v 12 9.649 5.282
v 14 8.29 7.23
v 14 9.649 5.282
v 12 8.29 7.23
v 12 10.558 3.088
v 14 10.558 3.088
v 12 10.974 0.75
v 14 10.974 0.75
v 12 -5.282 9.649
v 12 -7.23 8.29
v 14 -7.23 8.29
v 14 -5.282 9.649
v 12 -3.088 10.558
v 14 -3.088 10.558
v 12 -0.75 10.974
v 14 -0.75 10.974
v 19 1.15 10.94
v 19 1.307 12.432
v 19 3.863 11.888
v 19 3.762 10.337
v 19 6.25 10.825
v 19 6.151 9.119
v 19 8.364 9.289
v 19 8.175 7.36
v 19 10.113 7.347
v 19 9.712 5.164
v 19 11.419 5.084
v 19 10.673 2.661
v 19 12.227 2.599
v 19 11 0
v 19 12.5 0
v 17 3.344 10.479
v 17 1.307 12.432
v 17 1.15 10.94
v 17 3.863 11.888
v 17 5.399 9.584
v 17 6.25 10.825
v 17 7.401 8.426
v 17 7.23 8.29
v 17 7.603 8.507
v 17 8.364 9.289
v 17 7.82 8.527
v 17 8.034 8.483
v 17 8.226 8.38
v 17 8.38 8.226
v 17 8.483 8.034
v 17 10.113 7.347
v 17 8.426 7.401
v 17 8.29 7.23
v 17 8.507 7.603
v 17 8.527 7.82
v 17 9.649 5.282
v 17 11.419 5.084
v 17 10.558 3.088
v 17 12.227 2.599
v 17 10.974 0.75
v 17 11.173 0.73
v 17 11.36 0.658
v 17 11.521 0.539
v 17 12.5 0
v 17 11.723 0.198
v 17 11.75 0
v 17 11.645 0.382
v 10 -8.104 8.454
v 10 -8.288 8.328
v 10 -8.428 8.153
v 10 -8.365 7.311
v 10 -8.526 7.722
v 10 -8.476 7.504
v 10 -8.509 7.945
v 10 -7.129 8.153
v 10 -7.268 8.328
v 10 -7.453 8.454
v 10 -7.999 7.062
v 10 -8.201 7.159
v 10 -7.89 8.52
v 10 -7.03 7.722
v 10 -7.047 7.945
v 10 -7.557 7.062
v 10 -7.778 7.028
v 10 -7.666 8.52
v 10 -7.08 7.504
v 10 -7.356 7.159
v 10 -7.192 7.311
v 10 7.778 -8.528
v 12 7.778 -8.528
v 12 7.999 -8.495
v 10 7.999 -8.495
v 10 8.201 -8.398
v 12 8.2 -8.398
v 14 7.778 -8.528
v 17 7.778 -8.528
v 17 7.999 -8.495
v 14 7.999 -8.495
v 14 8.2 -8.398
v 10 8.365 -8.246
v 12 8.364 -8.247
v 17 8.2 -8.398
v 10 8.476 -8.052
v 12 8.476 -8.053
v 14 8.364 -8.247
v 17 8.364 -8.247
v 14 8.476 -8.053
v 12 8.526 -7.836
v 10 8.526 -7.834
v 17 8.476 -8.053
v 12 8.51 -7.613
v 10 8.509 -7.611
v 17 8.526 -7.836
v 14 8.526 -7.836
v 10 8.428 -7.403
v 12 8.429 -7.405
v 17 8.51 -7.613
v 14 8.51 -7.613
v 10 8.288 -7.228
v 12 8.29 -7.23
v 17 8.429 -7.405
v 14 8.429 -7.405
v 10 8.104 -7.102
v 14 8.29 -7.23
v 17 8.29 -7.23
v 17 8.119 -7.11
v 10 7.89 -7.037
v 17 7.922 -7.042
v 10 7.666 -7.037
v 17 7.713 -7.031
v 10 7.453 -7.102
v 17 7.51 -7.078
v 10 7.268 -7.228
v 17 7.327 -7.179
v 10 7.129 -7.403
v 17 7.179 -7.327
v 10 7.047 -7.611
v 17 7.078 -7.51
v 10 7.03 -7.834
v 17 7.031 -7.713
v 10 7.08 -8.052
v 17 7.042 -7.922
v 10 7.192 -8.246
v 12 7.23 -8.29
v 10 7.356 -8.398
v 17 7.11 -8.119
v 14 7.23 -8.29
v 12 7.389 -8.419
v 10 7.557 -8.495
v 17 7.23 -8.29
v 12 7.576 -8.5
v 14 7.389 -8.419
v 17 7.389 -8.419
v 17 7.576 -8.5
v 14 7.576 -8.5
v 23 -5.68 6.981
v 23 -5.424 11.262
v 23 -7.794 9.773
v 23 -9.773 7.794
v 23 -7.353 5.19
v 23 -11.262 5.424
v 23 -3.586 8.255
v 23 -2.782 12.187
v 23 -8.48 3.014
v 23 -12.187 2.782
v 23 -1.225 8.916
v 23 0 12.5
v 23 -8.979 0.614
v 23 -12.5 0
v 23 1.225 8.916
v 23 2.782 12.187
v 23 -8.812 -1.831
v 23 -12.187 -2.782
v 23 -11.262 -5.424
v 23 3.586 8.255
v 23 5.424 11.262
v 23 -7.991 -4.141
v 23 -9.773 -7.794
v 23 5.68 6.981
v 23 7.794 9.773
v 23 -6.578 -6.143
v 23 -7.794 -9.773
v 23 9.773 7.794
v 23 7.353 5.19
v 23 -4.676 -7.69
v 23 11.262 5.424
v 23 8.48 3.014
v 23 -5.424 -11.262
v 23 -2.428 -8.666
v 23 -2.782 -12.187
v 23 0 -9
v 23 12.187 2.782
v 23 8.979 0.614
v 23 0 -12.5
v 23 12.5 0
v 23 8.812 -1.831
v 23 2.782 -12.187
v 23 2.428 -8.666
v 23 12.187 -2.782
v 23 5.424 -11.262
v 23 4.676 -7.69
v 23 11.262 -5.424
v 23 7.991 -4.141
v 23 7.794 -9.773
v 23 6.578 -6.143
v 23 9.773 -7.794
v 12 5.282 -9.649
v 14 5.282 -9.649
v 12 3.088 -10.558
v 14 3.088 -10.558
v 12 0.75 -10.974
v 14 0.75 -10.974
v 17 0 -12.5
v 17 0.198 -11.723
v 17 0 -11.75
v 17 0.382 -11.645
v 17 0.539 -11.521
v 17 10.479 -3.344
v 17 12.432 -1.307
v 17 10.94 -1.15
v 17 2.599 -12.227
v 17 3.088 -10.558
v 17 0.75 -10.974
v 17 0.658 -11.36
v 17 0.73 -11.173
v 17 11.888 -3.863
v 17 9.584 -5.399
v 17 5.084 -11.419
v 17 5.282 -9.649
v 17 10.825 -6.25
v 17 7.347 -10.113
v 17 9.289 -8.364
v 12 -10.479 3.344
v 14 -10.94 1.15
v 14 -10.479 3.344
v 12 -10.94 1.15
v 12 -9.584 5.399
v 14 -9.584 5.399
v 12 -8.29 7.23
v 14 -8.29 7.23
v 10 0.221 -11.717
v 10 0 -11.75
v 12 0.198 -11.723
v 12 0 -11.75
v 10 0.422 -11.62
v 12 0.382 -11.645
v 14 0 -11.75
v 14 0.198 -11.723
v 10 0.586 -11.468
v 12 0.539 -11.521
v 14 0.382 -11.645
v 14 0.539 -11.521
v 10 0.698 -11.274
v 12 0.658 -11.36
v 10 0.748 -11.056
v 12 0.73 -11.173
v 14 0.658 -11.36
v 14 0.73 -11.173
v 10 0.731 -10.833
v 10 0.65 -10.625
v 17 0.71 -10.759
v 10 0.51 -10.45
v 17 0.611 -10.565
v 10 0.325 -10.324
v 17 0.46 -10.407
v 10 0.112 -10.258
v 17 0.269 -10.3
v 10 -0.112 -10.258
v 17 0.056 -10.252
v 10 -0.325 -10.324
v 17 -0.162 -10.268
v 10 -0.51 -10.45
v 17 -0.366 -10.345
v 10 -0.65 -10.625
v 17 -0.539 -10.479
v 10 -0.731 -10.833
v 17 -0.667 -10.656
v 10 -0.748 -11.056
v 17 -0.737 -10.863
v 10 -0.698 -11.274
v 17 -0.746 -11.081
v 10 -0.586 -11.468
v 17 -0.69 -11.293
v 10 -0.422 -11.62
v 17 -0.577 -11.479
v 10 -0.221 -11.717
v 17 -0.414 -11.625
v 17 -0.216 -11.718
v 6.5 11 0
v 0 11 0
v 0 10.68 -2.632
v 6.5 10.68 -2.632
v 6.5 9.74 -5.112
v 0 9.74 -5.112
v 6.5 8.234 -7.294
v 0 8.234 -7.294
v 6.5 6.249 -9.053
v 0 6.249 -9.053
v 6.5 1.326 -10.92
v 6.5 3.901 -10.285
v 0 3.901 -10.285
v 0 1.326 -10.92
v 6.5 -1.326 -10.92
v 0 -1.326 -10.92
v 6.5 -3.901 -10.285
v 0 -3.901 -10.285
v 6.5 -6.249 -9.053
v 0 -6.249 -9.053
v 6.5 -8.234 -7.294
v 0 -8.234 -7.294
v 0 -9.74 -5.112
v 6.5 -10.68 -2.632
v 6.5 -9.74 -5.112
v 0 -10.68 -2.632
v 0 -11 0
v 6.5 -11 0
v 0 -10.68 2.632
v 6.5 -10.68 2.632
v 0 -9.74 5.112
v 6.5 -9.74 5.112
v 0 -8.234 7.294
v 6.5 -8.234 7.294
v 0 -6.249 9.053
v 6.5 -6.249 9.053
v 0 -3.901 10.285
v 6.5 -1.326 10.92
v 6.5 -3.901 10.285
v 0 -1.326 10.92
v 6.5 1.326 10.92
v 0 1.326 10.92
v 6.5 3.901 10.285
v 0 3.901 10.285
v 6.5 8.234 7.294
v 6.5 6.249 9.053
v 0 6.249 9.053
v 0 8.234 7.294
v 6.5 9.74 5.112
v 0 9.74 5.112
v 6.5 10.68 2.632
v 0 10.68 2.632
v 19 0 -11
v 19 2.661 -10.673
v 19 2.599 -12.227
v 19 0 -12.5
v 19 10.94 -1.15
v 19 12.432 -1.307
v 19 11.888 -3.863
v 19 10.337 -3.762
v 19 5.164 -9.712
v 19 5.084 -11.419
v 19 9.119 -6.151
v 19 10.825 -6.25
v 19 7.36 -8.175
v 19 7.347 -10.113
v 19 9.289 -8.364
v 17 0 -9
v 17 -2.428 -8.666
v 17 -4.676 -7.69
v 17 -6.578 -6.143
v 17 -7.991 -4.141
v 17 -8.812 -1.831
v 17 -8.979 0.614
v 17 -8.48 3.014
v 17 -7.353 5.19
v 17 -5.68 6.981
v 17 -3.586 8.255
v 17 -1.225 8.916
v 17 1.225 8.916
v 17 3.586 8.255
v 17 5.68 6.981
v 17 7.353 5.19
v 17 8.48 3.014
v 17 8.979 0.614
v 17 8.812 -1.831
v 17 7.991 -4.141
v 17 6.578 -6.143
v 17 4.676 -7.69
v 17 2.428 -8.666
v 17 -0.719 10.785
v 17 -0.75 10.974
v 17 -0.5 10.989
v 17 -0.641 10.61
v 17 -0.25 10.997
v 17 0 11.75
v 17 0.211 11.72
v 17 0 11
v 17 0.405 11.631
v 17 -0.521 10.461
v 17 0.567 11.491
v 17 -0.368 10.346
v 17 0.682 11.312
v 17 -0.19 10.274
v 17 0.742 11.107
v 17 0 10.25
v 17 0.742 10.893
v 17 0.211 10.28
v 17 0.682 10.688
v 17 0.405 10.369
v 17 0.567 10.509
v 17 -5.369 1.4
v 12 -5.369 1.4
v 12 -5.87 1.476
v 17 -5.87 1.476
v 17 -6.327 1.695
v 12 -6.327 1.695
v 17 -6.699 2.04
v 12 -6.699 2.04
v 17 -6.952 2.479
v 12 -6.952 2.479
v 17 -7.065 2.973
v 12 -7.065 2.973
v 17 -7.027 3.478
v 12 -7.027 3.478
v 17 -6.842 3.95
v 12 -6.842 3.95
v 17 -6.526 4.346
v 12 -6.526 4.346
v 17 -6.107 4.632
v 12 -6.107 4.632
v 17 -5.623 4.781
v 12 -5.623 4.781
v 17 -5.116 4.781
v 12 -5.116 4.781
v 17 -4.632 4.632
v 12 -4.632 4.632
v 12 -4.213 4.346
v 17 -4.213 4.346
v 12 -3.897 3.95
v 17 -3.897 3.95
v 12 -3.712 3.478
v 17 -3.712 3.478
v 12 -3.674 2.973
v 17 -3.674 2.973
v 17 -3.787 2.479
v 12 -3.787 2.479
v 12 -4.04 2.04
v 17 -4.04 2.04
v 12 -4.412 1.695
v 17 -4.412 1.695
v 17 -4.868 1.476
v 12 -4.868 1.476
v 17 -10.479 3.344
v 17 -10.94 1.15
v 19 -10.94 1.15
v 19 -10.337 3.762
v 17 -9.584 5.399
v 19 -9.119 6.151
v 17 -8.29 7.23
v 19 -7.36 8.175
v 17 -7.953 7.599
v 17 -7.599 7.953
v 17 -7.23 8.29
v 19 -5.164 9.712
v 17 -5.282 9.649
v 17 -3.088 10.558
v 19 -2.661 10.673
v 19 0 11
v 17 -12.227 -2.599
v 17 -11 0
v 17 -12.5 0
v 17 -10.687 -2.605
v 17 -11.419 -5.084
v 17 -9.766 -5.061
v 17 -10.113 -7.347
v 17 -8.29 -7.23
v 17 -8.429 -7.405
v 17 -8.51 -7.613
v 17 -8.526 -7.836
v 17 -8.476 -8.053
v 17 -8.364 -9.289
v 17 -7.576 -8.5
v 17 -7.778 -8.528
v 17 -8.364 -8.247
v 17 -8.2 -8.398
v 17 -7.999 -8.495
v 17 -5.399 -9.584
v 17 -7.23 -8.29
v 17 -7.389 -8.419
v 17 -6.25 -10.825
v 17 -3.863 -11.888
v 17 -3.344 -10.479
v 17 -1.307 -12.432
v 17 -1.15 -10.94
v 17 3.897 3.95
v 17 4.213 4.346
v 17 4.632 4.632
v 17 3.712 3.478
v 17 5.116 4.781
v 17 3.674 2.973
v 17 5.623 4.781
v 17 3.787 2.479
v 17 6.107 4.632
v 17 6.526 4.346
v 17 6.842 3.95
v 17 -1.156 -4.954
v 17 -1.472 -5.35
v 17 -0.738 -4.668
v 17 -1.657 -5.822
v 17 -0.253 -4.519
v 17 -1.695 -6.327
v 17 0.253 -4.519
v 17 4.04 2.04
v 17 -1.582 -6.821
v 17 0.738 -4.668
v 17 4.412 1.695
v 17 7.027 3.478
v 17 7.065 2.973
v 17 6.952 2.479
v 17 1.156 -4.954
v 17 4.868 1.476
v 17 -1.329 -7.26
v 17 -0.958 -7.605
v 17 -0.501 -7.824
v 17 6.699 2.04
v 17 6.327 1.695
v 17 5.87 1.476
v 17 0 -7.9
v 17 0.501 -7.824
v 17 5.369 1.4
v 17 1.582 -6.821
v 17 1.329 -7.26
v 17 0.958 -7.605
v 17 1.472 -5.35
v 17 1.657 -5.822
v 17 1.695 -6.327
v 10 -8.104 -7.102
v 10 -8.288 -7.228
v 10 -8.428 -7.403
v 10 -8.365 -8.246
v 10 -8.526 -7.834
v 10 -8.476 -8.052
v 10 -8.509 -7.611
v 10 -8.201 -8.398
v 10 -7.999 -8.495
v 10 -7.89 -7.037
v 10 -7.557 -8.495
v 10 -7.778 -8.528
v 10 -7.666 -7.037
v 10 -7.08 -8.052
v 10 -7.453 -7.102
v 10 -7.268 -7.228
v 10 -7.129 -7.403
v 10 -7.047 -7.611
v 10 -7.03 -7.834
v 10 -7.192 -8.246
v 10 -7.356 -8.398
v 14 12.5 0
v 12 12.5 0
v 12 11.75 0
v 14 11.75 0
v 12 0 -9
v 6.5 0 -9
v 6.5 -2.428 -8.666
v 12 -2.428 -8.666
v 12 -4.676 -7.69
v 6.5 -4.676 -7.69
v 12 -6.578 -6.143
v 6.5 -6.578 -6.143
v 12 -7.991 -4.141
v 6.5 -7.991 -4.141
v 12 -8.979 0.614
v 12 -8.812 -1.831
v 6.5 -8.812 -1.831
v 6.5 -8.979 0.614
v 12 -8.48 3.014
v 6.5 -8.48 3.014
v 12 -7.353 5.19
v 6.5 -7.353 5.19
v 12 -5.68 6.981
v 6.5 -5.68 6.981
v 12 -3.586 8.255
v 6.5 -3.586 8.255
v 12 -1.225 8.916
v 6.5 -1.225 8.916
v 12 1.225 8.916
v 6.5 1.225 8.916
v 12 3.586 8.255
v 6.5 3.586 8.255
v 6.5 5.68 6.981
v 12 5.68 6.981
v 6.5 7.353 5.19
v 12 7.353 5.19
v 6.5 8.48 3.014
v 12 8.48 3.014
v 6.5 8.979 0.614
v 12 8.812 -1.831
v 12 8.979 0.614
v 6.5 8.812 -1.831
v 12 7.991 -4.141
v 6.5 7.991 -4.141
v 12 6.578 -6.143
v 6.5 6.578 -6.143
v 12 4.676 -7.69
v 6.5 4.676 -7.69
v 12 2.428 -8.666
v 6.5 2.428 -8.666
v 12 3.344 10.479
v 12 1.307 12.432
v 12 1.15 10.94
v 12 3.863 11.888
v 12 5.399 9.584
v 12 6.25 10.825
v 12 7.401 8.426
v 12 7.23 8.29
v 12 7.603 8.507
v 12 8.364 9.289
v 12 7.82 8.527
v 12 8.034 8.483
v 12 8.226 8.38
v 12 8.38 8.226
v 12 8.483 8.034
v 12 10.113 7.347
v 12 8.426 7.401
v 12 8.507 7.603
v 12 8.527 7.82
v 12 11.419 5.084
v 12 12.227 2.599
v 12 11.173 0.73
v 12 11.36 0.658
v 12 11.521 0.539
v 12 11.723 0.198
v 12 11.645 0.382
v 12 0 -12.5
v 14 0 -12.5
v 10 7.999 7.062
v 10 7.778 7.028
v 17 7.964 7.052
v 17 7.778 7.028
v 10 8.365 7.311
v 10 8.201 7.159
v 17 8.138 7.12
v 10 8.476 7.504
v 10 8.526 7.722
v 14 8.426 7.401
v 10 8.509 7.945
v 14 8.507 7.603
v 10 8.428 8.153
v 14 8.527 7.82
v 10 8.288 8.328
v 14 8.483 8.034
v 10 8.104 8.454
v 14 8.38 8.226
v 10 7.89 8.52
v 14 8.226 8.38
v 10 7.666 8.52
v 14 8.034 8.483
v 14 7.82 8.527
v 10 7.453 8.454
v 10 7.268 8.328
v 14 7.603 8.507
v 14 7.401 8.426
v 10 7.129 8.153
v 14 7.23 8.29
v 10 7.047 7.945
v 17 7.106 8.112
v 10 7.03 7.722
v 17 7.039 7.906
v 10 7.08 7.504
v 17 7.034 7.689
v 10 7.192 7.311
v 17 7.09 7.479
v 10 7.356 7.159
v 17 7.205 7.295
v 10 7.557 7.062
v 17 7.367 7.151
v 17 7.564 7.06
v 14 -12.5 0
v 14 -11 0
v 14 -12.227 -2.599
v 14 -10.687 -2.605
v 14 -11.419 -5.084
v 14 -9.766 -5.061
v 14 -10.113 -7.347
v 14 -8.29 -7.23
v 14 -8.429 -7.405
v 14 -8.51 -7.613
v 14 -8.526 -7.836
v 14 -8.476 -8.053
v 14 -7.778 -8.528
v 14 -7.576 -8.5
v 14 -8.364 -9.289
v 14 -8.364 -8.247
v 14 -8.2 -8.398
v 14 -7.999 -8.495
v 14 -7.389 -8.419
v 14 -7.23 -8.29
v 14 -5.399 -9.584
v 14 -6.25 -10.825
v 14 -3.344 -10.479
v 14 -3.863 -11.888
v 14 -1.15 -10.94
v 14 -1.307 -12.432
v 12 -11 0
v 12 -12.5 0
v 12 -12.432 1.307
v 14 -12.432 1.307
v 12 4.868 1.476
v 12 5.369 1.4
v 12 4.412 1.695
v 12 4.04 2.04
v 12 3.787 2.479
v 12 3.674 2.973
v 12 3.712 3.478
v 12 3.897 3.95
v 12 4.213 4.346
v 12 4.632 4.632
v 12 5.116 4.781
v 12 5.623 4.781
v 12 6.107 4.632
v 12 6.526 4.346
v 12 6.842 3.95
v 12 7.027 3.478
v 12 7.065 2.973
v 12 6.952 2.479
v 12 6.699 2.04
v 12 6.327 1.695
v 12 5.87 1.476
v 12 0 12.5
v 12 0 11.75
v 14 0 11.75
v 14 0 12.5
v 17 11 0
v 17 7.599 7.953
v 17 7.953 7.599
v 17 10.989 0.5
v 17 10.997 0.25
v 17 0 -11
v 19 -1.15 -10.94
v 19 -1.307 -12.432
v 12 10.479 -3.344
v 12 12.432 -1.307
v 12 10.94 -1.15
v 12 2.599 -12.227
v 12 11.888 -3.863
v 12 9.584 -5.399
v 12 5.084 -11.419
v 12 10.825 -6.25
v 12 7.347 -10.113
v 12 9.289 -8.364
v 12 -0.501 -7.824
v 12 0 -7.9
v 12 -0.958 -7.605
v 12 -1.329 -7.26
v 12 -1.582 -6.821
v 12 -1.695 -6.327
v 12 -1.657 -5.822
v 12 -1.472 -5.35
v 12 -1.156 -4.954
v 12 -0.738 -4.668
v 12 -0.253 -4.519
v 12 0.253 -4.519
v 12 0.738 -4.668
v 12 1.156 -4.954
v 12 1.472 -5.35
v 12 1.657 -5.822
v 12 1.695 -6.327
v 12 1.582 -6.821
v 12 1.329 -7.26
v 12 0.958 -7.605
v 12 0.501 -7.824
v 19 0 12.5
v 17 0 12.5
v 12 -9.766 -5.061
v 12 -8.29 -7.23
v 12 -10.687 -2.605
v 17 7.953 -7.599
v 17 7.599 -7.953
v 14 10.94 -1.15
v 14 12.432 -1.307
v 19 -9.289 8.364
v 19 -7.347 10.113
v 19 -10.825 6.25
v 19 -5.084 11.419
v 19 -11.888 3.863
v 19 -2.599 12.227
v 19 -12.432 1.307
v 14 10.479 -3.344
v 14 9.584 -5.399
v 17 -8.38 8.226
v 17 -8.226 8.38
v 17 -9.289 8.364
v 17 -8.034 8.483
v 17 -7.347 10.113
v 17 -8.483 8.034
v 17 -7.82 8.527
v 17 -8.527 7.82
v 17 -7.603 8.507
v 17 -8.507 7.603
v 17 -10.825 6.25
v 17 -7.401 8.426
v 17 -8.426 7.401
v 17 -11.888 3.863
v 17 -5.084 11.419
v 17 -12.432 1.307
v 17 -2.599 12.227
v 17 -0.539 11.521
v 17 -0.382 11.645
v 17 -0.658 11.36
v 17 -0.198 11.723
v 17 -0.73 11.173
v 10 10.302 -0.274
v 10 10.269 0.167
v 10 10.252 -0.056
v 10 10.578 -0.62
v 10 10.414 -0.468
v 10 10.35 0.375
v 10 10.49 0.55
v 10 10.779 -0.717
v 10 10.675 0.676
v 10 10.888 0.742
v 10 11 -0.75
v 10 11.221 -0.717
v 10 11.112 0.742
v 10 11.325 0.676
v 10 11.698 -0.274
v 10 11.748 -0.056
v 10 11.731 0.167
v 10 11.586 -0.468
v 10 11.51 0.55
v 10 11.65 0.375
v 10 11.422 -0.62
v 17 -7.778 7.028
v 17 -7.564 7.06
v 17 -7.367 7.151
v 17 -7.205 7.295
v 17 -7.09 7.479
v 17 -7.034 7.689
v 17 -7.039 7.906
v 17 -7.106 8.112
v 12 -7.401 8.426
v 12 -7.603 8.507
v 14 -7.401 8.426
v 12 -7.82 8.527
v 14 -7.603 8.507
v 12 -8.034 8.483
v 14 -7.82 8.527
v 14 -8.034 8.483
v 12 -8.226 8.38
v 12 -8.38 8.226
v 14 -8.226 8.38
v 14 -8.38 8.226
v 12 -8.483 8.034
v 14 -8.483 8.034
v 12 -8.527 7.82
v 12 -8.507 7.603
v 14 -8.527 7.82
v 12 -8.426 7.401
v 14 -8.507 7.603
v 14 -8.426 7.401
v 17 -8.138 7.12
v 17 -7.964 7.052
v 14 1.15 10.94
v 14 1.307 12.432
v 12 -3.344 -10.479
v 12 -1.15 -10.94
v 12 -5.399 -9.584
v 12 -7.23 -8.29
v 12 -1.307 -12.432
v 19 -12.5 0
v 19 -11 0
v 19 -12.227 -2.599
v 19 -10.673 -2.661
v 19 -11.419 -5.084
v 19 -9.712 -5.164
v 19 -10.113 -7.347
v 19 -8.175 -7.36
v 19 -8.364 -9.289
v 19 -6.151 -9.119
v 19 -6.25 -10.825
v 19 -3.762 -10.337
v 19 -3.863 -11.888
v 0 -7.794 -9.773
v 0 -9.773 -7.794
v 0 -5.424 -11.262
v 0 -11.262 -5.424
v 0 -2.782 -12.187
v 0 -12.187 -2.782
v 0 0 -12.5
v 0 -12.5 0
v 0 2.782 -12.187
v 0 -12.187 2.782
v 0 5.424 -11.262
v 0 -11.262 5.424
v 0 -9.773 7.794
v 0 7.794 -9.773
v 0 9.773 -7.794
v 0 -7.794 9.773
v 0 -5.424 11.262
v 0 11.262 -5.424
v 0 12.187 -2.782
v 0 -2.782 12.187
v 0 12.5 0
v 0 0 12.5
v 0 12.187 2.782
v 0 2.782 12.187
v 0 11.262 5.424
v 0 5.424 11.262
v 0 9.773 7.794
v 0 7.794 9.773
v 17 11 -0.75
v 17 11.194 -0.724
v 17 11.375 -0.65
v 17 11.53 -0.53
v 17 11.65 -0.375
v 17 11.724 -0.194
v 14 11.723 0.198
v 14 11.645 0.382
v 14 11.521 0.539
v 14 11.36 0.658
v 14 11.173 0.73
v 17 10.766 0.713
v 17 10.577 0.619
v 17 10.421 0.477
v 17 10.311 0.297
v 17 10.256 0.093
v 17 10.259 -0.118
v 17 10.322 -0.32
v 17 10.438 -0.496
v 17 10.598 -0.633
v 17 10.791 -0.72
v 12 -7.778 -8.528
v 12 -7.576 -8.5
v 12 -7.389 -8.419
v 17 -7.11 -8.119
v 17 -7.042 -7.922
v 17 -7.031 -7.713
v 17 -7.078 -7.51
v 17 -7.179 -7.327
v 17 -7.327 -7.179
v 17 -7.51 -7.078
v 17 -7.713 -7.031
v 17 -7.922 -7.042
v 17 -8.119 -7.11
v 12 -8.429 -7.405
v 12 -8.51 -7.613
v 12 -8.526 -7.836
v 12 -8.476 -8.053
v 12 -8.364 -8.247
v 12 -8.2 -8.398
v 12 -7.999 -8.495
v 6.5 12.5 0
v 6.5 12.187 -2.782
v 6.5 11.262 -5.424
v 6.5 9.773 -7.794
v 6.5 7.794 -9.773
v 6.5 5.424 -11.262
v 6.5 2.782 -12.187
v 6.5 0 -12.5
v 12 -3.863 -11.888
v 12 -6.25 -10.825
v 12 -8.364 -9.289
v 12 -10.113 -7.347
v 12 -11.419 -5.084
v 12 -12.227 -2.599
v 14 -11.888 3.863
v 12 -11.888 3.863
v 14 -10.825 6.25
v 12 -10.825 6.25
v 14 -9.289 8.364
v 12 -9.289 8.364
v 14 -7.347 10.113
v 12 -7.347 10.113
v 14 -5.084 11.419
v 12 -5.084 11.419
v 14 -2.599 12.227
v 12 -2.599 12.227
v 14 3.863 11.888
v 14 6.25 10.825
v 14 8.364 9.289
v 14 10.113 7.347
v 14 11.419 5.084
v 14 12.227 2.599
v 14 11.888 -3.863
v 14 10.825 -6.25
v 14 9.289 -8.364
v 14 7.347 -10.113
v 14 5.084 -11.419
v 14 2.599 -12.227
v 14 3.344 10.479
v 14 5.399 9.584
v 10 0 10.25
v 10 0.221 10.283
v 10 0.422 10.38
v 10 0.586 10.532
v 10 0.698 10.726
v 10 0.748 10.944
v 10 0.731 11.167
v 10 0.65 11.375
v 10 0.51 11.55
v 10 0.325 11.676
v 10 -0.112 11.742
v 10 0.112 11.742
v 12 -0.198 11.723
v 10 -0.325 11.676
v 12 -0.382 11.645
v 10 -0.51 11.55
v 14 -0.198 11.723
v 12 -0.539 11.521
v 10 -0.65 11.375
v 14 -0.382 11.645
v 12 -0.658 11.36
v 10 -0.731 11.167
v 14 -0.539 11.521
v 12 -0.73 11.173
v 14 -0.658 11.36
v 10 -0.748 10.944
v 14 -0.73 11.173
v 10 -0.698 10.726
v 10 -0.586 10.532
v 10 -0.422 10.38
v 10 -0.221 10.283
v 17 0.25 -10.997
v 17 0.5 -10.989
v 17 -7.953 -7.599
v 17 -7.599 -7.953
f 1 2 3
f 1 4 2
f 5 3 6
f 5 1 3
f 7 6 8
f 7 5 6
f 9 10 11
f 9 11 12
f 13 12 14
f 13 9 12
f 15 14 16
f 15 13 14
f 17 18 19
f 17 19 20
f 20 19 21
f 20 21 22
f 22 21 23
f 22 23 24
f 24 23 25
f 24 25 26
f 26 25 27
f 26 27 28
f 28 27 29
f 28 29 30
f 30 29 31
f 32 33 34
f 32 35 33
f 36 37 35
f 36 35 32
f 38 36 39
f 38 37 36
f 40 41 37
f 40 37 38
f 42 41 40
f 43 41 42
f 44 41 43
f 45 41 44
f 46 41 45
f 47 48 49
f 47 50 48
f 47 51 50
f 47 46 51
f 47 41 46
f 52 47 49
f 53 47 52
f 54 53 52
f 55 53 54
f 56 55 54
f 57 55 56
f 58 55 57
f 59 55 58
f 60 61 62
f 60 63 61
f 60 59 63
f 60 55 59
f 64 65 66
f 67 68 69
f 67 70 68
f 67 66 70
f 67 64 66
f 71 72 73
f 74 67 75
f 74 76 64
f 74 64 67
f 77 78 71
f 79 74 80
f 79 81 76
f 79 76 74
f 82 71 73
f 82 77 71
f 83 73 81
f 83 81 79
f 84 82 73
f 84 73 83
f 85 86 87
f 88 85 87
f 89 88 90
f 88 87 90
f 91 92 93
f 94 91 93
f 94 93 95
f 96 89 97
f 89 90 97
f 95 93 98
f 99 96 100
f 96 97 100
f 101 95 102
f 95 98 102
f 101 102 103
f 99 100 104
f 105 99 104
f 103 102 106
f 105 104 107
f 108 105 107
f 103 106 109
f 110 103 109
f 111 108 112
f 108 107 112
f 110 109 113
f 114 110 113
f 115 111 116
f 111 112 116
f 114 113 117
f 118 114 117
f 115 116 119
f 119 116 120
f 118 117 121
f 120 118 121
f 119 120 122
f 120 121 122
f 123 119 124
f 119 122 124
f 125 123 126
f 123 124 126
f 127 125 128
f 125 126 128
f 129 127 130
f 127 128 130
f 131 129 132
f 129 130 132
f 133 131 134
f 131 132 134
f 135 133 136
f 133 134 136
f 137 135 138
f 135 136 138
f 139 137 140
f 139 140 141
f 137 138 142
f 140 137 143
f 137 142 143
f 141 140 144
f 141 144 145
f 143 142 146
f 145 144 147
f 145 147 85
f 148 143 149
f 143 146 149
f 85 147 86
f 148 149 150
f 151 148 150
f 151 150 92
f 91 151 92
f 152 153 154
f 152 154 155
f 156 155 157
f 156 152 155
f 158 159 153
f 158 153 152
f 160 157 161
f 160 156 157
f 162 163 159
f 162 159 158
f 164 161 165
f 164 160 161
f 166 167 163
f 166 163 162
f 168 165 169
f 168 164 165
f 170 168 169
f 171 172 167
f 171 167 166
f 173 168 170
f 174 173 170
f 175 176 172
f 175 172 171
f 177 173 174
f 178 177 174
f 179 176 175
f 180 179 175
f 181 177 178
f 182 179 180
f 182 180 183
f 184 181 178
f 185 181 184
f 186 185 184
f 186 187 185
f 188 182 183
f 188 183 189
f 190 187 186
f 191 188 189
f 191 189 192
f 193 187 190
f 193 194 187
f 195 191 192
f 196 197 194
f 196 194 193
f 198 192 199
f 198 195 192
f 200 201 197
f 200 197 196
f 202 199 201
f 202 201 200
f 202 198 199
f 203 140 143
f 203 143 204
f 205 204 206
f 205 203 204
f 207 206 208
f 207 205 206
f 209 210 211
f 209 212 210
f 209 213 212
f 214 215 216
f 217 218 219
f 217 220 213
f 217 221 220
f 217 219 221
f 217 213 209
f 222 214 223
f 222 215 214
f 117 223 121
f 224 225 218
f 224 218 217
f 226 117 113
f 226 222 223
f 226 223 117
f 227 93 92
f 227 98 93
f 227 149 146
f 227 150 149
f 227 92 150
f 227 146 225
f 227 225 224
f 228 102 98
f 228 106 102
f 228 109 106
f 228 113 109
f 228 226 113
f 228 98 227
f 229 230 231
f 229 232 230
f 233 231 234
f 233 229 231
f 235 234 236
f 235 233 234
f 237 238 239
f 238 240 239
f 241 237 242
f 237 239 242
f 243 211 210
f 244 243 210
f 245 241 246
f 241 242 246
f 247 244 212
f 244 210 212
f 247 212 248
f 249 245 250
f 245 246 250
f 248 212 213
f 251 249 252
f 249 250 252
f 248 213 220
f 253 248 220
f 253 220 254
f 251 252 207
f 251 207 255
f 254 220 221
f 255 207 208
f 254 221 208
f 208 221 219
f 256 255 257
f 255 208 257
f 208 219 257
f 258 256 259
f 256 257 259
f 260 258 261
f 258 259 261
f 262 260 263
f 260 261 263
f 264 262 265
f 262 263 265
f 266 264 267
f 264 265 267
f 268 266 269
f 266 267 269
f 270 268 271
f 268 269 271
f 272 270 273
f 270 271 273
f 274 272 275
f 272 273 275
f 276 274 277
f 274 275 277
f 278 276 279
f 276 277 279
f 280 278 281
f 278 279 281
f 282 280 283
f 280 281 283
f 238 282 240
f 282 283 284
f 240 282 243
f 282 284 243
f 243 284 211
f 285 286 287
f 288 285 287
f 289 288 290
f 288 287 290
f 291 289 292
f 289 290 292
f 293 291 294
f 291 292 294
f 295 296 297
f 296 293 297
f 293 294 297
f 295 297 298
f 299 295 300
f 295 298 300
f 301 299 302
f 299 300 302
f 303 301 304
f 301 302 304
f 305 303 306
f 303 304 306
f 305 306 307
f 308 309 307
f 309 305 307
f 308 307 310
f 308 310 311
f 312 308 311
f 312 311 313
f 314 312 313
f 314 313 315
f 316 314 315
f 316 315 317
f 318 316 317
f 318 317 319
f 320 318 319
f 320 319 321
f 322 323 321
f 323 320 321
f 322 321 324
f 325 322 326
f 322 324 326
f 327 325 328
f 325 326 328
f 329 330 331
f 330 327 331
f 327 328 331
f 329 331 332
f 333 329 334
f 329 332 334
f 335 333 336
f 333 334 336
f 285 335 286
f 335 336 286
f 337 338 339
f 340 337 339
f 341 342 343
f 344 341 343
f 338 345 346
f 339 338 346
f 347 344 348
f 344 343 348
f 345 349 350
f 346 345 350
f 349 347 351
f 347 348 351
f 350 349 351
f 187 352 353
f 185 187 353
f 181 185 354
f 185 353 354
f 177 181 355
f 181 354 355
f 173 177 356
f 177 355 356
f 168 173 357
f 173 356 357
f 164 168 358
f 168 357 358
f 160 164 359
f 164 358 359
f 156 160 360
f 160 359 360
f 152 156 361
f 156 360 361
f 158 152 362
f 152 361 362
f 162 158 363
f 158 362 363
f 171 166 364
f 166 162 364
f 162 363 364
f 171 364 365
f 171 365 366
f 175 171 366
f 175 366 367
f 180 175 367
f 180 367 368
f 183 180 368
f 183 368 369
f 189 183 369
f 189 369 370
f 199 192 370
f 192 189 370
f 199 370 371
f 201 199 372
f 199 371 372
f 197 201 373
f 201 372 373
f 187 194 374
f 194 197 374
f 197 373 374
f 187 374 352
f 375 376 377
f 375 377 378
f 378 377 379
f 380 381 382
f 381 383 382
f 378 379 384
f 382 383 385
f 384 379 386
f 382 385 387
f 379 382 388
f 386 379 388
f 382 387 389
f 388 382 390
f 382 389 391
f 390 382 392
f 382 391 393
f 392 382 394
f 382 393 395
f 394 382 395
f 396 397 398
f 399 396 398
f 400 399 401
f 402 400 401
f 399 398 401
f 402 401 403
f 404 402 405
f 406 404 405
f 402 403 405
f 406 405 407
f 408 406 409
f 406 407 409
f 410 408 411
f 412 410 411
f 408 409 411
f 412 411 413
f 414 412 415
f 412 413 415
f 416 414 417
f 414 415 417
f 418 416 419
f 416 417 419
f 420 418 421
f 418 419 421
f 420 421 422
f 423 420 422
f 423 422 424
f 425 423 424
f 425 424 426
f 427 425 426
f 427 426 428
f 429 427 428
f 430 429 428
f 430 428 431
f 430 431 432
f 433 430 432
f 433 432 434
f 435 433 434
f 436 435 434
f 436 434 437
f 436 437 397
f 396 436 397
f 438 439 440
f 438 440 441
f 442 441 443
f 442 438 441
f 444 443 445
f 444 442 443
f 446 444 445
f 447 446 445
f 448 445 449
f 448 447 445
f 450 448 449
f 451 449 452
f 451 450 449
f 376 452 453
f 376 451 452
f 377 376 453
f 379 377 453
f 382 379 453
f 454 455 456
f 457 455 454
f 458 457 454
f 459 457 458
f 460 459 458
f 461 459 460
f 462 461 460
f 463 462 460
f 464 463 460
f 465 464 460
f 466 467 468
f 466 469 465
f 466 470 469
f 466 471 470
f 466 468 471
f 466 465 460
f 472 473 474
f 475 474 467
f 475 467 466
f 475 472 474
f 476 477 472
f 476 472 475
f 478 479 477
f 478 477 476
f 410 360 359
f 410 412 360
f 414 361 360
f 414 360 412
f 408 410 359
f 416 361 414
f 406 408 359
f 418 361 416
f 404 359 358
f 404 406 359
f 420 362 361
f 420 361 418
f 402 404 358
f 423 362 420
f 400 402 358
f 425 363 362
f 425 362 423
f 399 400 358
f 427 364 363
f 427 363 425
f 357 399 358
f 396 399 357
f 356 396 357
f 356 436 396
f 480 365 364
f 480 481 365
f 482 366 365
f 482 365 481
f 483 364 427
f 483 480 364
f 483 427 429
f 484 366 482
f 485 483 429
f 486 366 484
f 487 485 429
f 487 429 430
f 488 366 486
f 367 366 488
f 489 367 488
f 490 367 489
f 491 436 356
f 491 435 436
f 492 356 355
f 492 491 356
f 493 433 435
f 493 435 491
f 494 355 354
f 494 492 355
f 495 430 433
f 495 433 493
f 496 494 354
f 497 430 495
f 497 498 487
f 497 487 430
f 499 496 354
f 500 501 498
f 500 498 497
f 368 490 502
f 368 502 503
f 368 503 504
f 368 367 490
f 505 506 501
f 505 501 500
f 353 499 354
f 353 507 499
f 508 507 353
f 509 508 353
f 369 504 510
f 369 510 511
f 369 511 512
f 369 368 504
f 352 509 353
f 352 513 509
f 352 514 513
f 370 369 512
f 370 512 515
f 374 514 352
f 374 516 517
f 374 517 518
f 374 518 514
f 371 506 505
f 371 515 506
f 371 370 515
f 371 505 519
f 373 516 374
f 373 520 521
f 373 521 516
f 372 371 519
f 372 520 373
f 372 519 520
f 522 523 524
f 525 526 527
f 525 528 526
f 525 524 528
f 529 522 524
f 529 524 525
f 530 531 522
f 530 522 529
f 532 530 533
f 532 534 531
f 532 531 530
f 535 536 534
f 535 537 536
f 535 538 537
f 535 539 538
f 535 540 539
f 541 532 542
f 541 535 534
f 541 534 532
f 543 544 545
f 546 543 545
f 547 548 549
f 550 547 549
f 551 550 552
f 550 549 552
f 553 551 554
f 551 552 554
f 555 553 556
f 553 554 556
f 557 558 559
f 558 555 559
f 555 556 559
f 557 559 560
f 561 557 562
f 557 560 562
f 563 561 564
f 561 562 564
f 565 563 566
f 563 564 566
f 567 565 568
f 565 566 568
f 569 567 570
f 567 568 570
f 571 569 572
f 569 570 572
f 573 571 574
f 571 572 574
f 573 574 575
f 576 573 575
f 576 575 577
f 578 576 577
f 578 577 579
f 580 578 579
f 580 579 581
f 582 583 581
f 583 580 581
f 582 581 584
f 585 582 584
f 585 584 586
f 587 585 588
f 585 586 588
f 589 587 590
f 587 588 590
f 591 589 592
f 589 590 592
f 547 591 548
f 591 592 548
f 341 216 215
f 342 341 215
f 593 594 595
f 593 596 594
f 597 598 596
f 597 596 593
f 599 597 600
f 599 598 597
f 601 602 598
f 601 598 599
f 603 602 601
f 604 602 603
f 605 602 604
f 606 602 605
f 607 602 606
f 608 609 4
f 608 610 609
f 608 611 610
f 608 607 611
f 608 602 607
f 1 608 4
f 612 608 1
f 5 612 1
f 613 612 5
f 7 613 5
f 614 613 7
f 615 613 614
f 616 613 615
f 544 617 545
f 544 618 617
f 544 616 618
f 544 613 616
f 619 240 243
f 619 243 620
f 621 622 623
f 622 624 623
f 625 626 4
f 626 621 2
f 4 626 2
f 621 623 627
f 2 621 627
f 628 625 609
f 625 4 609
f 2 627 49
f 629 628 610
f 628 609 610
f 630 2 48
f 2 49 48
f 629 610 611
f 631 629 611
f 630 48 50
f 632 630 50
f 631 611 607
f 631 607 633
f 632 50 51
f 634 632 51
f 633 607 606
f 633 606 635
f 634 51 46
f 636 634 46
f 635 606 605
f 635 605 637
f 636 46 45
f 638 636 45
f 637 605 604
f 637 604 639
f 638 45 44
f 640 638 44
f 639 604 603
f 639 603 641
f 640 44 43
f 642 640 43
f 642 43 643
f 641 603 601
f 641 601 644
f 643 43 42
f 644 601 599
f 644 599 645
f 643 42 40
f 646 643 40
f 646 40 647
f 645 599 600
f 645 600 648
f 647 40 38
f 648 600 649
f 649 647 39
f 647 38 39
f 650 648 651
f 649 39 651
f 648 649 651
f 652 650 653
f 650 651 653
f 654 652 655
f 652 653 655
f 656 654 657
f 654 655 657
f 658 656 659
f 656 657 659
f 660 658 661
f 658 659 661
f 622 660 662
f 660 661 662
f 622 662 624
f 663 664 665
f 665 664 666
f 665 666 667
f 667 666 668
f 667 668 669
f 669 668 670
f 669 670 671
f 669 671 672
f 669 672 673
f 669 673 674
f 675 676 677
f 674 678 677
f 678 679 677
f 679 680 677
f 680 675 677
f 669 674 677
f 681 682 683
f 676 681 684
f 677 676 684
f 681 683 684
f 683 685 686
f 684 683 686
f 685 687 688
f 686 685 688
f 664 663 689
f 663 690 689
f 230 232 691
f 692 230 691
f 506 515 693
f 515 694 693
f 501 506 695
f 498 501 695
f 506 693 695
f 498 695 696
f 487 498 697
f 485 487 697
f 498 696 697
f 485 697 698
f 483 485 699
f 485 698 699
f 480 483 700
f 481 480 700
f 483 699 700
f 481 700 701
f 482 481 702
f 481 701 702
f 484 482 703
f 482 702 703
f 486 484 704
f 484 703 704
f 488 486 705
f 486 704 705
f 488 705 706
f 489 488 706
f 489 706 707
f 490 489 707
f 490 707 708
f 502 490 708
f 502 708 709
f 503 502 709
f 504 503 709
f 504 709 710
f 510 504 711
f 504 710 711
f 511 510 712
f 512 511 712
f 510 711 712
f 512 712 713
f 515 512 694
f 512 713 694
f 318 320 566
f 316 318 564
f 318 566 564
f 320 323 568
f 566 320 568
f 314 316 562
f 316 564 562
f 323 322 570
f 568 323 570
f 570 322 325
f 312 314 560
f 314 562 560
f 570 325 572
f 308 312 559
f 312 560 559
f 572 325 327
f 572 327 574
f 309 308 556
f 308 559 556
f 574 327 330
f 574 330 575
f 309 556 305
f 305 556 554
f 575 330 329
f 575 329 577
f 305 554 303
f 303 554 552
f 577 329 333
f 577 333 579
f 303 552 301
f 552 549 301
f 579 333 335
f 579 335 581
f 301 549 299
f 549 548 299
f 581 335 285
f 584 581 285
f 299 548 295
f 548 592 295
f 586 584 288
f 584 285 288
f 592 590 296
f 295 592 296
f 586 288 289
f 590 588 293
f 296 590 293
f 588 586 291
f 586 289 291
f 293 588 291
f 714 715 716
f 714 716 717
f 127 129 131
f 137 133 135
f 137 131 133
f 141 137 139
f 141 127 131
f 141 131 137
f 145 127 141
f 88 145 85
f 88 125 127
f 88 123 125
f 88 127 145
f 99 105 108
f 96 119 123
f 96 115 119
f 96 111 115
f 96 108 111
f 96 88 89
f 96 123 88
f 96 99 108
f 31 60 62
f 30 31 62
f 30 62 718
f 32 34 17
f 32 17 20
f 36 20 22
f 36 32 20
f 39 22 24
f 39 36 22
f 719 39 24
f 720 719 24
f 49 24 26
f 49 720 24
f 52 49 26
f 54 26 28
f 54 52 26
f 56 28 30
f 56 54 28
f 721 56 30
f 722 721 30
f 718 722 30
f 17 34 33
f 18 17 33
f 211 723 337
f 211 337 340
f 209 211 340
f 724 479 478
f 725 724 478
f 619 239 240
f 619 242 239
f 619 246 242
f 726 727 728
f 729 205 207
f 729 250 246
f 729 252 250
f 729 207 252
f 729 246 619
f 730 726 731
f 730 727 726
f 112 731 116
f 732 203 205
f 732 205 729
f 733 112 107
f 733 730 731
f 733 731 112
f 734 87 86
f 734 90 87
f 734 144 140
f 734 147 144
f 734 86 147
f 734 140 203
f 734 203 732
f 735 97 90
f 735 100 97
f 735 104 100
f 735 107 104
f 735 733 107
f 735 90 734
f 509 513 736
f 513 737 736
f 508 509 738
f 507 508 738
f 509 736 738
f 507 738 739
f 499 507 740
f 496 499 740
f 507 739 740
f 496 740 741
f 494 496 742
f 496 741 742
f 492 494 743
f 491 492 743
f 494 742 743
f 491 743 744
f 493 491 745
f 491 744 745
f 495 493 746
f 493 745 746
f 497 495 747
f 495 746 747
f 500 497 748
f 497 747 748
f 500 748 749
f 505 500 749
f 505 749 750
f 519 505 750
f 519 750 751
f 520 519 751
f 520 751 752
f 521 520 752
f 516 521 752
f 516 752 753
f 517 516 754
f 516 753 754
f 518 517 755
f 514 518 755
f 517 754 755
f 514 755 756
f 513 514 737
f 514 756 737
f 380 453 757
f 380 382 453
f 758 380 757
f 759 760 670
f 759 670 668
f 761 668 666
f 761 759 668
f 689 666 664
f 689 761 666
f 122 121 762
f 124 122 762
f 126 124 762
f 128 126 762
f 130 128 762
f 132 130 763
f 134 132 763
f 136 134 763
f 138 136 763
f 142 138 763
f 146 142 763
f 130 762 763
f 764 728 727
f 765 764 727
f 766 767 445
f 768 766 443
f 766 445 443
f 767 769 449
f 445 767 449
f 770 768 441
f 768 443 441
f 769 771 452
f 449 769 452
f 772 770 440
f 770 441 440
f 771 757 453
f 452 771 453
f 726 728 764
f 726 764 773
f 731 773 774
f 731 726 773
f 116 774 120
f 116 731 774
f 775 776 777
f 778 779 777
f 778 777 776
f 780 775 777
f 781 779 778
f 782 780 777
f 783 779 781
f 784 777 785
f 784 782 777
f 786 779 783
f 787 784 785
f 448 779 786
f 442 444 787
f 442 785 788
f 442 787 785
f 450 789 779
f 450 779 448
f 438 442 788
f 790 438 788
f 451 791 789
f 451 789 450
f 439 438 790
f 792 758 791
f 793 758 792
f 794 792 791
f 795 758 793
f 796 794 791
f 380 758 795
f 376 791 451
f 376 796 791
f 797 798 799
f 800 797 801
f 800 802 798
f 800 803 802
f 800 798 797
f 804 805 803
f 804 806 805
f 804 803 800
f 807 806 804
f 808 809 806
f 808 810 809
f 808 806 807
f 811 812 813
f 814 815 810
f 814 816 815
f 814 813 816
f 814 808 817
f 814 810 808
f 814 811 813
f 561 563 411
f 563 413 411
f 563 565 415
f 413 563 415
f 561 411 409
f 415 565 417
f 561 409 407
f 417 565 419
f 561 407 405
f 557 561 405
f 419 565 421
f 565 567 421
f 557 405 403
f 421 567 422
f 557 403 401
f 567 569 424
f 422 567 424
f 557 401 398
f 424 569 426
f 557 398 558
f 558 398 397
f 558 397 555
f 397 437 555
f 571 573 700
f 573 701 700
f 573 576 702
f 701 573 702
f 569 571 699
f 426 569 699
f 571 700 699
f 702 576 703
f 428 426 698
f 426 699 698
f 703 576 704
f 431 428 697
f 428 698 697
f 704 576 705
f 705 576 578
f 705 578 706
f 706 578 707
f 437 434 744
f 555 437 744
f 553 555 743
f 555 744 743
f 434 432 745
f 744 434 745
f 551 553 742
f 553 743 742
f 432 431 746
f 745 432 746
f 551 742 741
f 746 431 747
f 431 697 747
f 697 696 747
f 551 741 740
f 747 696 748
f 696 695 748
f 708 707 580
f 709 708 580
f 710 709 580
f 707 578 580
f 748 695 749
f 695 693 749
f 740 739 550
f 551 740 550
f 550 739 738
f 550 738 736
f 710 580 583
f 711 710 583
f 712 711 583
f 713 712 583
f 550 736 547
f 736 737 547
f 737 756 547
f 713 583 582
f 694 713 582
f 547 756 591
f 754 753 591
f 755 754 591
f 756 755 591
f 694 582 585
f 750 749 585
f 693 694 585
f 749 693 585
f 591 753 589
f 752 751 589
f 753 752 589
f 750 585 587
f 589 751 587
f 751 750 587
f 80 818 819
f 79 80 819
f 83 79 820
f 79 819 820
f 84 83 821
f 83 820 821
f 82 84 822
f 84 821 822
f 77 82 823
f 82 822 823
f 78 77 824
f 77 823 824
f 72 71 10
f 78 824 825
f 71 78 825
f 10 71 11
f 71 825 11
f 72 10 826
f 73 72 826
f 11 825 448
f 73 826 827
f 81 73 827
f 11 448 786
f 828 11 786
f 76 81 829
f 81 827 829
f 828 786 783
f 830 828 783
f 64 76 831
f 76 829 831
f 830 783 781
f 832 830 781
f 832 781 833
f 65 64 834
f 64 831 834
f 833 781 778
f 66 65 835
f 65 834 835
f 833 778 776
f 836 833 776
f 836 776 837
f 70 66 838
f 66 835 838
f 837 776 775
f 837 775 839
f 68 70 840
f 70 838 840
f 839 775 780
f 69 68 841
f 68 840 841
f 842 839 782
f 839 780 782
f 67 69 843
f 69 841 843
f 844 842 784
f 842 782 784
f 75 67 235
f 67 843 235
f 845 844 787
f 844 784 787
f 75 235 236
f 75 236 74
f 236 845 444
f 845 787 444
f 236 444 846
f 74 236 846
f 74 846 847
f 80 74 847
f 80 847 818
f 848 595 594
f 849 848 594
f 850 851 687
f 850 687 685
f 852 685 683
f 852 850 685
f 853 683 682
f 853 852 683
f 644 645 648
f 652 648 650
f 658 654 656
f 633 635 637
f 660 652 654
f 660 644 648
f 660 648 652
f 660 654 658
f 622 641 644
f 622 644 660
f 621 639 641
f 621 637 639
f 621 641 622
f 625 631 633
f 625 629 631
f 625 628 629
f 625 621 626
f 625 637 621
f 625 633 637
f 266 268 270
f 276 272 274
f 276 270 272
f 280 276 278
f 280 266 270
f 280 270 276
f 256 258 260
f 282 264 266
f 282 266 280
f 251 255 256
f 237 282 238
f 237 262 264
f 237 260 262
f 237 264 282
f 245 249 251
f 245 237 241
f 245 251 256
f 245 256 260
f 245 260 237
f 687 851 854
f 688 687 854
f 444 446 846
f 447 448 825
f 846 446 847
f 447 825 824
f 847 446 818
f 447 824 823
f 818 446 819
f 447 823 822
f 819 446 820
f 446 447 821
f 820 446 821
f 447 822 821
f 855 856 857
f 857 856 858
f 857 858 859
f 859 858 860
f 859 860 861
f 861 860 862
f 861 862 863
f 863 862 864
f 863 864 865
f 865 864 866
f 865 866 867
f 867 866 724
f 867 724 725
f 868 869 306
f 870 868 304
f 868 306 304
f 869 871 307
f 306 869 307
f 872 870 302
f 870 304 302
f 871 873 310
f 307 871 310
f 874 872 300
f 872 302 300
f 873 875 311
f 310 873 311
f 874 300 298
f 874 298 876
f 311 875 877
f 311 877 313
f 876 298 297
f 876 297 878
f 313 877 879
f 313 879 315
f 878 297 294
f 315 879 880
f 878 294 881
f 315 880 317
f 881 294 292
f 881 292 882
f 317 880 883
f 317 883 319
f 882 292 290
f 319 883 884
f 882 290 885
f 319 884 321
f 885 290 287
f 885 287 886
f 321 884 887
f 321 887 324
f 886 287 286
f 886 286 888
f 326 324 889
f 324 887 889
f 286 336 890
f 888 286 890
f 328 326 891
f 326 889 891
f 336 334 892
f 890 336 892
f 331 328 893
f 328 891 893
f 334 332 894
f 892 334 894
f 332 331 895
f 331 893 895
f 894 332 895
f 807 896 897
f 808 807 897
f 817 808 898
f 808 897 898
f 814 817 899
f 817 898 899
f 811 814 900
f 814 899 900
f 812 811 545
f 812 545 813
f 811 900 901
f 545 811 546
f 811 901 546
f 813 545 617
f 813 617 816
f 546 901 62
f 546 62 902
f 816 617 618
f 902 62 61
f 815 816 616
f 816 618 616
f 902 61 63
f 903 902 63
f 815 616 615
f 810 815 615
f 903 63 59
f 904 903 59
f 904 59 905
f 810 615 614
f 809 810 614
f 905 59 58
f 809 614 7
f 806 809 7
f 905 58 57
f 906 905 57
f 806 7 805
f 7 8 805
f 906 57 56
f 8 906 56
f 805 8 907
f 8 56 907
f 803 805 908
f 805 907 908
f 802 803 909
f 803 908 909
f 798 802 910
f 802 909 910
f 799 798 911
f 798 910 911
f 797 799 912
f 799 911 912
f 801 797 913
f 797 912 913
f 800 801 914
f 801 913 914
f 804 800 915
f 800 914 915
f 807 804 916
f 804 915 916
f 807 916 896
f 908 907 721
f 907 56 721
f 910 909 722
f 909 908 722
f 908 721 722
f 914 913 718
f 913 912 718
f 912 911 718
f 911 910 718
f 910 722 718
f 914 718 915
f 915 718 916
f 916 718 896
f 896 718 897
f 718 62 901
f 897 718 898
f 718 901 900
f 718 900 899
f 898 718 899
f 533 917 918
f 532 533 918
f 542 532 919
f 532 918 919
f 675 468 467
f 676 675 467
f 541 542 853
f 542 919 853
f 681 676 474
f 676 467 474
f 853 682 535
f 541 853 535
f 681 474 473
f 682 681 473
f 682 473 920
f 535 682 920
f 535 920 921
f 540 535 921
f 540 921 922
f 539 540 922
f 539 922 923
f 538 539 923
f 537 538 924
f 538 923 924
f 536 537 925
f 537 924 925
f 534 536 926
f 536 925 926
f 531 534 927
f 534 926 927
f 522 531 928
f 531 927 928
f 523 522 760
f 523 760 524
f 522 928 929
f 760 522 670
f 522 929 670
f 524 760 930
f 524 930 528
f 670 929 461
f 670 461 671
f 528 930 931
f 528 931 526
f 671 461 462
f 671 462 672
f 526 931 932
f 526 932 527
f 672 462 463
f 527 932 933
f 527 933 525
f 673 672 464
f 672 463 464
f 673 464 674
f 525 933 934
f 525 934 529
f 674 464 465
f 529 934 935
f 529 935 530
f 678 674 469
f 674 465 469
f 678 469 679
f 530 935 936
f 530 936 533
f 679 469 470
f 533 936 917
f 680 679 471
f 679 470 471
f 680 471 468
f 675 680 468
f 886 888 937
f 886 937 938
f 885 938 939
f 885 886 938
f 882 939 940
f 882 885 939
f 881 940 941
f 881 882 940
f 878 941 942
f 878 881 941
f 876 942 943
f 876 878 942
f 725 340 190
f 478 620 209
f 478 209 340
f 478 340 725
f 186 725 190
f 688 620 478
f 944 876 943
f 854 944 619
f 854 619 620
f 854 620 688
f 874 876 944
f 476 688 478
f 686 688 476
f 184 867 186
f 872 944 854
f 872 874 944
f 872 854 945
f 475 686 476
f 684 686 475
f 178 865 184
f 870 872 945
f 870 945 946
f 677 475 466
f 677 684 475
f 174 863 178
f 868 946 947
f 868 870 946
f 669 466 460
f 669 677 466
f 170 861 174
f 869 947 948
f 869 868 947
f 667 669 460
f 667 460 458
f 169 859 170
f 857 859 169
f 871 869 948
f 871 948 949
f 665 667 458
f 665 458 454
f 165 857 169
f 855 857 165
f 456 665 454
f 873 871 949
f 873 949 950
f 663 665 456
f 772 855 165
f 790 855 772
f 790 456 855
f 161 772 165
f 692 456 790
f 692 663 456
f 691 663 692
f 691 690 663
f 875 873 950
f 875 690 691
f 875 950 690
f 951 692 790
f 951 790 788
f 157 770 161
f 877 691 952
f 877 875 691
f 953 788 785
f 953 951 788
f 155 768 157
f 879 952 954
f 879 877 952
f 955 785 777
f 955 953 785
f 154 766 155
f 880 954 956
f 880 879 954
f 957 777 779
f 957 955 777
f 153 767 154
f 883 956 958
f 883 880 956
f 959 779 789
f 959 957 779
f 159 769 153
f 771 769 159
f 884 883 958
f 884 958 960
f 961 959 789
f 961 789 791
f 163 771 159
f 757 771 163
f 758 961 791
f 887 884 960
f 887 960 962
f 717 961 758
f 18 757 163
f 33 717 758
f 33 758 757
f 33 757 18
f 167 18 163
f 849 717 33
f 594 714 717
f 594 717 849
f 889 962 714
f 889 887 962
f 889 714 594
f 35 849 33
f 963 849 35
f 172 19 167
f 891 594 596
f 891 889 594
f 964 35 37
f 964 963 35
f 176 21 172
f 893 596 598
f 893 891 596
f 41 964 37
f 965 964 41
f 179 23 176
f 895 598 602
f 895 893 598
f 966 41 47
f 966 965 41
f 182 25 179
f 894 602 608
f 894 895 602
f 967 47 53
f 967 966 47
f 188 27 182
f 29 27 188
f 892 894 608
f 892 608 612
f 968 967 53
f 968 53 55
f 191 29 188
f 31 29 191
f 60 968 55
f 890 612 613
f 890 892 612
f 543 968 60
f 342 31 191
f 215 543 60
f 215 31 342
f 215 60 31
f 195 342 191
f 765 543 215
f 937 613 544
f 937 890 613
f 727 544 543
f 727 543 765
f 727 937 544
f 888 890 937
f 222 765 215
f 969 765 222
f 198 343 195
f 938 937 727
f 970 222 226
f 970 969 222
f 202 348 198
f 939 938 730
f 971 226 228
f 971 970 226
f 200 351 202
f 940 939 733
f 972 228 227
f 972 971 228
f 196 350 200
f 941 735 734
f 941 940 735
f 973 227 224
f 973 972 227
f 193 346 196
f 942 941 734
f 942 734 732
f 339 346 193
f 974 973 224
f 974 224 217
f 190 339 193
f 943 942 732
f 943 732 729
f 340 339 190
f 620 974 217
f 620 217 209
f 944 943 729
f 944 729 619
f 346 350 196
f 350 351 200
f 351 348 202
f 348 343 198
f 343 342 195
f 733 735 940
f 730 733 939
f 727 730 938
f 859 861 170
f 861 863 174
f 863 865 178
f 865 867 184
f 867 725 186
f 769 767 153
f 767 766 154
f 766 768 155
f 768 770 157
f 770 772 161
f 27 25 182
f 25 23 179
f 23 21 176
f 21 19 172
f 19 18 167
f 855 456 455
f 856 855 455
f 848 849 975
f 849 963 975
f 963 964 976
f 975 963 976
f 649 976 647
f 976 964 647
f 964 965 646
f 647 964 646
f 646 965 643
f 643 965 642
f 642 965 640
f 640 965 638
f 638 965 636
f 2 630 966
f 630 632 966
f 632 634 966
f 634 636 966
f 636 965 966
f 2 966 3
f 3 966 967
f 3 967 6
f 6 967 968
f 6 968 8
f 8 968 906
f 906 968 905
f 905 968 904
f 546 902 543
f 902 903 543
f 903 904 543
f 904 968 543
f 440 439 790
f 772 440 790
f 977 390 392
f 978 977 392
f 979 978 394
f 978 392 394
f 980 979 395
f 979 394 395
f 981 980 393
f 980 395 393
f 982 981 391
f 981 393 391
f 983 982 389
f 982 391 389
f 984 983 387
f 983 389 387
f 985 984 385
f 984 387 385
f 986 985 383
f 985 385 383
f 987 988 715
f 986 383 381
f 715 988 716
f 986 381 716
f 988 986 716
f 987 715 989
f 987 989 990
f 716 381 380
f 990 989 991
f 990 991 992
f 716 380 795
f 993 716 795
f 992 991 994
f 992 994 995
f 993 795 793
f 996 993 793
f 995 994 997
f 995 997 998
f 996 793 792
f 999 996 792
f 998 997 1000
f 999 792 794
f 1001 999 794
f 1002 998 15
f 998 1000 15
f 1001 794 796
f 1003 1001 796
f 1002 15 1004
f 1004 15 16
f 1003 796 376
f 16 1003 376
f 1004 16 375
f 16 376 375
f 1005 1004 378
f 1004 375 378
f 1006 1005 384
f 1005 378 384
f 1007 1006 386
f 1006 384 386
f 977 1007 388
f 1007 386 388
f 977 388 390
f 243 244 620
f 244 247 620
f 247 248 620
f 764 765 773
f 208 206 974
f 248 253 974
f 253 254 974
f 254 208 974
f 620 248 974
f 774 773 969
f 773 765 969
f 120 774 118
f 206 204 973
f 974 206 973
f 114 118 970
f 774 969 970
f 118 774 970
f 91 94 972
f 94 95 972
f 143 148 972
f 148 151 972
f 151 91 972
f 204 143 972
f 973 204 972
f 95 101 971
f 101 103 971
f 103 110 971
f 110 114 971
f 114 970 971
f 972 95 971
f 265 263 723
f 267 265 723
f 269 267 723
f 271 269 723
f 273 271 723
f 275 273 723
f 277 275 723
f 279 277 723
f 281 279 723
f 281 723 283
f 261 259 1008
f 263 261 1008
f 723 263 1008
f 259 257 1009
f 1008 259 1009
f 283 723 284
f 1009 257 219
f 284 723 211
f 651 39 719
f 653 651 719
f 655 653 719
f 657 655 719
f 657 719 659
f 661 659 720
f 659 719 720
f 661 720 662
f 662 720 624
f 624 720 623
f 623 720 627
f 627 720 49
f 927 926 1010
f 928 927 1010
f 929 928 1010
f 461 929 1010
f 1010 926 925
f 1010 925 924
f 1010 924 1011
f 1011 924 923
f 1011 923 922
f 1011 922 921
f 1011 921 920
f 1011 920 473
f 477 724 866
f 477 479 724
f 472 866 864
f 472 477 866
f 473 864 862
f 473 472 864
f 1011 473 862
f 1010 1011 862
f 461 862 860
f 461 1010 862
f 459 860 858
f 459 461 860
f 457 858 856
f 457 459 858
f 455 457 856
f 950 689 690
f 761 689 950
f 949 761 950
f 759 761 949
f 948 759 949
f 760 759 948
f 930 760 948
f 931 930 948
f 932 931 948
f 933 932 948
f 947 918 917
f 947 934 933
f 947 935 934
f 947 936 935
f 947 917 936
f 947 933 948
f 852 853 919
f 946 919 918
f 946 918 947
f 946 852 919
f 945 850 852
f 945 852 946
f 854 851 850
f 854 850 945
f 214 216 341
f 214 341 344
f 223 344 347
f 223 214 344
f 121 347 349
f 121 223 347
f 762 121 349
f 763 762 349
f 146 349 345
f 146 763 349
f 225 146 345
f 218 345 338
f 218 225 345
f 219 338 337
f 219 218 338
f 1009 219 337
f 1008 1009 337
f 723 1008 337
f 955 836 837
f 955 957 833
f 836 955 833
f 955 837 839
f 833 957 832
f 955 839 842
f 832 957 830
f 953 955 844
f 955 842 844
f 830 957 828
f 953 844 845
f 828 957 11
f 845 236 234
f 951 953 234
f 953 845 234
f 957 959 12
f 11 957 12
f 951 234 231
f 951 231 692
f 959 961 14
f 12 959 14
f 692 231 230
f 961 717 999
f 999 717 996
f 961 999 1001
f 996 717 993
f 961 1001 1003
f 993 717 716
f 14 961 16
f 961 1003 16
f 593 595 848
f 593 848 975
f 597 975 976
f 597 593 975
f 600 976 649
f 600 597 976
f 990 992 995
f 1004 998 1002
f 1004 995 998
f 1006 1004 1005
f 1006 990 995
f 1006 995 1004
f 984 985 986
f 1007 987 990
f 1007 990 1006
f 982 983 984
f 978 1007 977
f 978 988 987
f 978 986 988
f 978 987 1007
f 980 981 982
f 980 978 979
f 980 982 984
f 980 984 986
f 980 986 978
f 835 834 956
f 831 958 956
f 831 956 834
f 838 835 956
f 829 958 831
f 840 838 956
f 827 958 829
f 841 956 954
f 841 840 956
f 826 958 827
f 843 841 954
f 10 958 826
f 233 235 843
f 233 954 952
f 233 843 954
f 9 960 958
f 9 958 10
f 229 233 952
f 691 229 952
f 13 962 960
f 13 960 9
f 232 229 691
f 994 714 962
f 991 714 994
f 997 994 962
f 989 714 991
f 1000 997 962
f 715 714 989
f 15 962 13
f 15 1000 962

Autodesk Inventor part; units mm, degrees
ref_plane "YZ Plane" through (0, 0, 0) normal (1, 0, 0) x (0, 1, 0)
ref_plane "XZ Plane" through (0, 0, 0) normal (0, 1, 0) x (-1, 0, 0)
ref_plane "XY Plane" through (0, 0, 0) normal (0, 0, 1) x (1, 0, 0)
sketch "Sketch1" plane through (0, 0, 0) normal (1, 0, 0) x (0, 1, 0)
  circle A0 centre (0, 0) radius 12.5
  circle A1 centre (0, 0) radius 11
  dimension "d0" = 25
  dimension "d1" = 22
extrude "Extrusion1" add sketch "Sketch1" along normal blind 6.5
sketch "Sketch2" plane through (6.5, 0, 0) normal (1, 0, 0) x (0, 0, -1)
  circle A0 centre (0, 0) radius 9
  circle A1 centre (0, 0) radius 12.5
  dimension "d4" = 18
extrude "Extrusion2" add sketch "Sketch2" along normal blind 5.5
sketch "Sketch3" plane through (12, 0, 0) normal (1, 0, 0) x (0, 0, -1)
  circle A0 centre (0, 0) radius 11
  dimension "d55" = 22
extrude "Extrusion3" add sketch "Sketch3" along normal blind 2
sketch "Sketch4" plane through (14, 0, 0) normal (1, 0, 0) x (0, 0, -1)
  circle A0 centre (0, 0) radius 12.5
extrude "Extrusion4" add sketch "Sketch4" along normal blind 3
sketch "Sketch5" plane through (17, 0, 0) normal (1, 0, 0) x (0, 0, -1)
  circle A0 centre (0, 0) radius 9
  circle A1 centre (0, 0) radius 11
  dimension "d54" = 22
extrude "Extrusion5" add sketch "Sketch5" along normal blind 2
sketch "Sketch7" plane through (17, 0, 0) normal (1, 0, 0) x (0, 0, -1)
  line L0 (0, 0) -> (6.2, 0)
  line L1 (0, 0) -> (-3.1, 5.3694)
  line L2 (0, 0) -> (6.2, 0) construction
  line L3 (0, 0) -> (-3.1, -5.3694)
  line L4 (0, 0) -> (6.2, 0) construction
  dimension "d15" = 6.2
  dimension "d16" = 6.2
  dimension "d17" = 120
  dimension "d18" = 6.2
  dimension "d19" = 120
hole "Hole1" at (17, 5.3694, 3.1) at (17, 0, -6.2) at (17, -5.3694, 3.1) direction (-1, 0, 0) diameter 3.4 end through all clearance for "Countersunk Flat Head Screw ISO 2009/7046" size "M3" standard "ISO"
sketch "Sketch8" plane through (12, 0, 0) normal (1, 0, 0) x (0, 0, -1)
  circle A0 centre (0, 0) radius 9
  circle A1 centre (0, 0) radius 9 projected
  circle A2 centre (0, 0) radius 12.5
  line L0 (-9, 0) -> (-12.5, 0)
  line L1 (-8.9507, 0.9408) -> (-12.4315, 1.3066)
  line L2 (-0.9408, -8.9507) -> (-1.3066, -12.4315)
  circle A3 centre (0, 0) radius 12.5 projected
  line L3 (0, -12.5) -> (0, -9)
  line L4 (9, 0) -> (12.5, 0)
  line L5 (0.9408, 8.9507) -> (1.3066, 12.4315)
  line L6 (0, 12.5) -> (0, 9)
  line L7 (-0.2849, 0.0299) -> (8.8591, 0.0299) construction
  line L8 (8.9507, -0.9408) -> (12.4315, -1.3066)
extrude "Extrusion7" add sketch "Sketch8" along normal blind 7 contours L4 A2 L8 A0 | A0 L6 A2 L5 | L3 A2 L2 A0 | A0 L0 A2 L1
sketch "Sketch10" plane through (17, 0, 0) normal (1, 0, 0) x (0, 0, -1)
  circle A0 centre (0, 0) radius 11
  circle A1 centre (0, 11) radius 0.75
  arc A2 (-11, 0) -> (-1.1498, -10.9397) centre (0, 0) ccw projected
  circle A3 centre (-11, 0) radius 0.75
  line L0 (0, -11) -> (0, -12.5) projected
  circle A4 centre (0, -11) radius 0.75
  circle A5 centre (11, 0) radius 0.75
  line L1 (0, 0) -> (10.9982, 0) construction
  line L2 (0, 0) -> (7.7782, 7.7782)
  line L3 (0, 0) -> (11, 0) construction
  circle A6 centre (7.7782, 7.7782) radius 0.75
  line L4 (0, 0) -> (-7.7782, 7.7782)
  line L5 (0, 0) -> (-7.7782, -7.7782)
  line L6 (0, 0) -> (7.7782, -7.7782)
  circle A7 centre (-7.7782, -7.7782) radius 0.75
  circle A8 centre (7.7782, -7.7782) radius 0.75
  circle A9 centre (-7.7782, 7.7782) radius 0.75
  dimension "d60" = 1.5
  dimension "d61" = 1.5
  dimension "d62" = 1.5
  dimension "d63" = 1.5
  dimension "d66" = 11
  dimension "d67" = 45
  dimension "d68" = 1.5
  dimension "d69" = 11
  dimension "d70" = 11
  dimension "d71" = 11
  dimension "d72" = 1.5
  dimension "d73" = 1.5
  dimension "d74" = 1.5
extrude "Extrusion8" cut sketch "Sketch10" against normal blind 7 contours A0 A5 | A0 A5 | A6 L2 A0 | A0 A6 | A8 A0 | A0 L6 A8 | L2 A6 A0 | A0 A8 L6 | A1 A0 | A0 A1 | A9 A0 L4 | L4 A0 A9 | A7 A0 L5 | L5 A0 A7 | A0 A9 | A0 A7 | A3 A0 | A0 A3
sketch "Sketch11" plane through (19, 0, 0) normal (1, 0, 0) x (0, 0, -1)
  circle A0 centre (0, 0) radius 9
  circle A1 centre (0, 0) radius 12.5
  dimension "d77" = 18
  dimension "d78" = 25
extrude "Extrusion9" add sketch "Sketch11" along normal blind 4
properties part number "felga"
